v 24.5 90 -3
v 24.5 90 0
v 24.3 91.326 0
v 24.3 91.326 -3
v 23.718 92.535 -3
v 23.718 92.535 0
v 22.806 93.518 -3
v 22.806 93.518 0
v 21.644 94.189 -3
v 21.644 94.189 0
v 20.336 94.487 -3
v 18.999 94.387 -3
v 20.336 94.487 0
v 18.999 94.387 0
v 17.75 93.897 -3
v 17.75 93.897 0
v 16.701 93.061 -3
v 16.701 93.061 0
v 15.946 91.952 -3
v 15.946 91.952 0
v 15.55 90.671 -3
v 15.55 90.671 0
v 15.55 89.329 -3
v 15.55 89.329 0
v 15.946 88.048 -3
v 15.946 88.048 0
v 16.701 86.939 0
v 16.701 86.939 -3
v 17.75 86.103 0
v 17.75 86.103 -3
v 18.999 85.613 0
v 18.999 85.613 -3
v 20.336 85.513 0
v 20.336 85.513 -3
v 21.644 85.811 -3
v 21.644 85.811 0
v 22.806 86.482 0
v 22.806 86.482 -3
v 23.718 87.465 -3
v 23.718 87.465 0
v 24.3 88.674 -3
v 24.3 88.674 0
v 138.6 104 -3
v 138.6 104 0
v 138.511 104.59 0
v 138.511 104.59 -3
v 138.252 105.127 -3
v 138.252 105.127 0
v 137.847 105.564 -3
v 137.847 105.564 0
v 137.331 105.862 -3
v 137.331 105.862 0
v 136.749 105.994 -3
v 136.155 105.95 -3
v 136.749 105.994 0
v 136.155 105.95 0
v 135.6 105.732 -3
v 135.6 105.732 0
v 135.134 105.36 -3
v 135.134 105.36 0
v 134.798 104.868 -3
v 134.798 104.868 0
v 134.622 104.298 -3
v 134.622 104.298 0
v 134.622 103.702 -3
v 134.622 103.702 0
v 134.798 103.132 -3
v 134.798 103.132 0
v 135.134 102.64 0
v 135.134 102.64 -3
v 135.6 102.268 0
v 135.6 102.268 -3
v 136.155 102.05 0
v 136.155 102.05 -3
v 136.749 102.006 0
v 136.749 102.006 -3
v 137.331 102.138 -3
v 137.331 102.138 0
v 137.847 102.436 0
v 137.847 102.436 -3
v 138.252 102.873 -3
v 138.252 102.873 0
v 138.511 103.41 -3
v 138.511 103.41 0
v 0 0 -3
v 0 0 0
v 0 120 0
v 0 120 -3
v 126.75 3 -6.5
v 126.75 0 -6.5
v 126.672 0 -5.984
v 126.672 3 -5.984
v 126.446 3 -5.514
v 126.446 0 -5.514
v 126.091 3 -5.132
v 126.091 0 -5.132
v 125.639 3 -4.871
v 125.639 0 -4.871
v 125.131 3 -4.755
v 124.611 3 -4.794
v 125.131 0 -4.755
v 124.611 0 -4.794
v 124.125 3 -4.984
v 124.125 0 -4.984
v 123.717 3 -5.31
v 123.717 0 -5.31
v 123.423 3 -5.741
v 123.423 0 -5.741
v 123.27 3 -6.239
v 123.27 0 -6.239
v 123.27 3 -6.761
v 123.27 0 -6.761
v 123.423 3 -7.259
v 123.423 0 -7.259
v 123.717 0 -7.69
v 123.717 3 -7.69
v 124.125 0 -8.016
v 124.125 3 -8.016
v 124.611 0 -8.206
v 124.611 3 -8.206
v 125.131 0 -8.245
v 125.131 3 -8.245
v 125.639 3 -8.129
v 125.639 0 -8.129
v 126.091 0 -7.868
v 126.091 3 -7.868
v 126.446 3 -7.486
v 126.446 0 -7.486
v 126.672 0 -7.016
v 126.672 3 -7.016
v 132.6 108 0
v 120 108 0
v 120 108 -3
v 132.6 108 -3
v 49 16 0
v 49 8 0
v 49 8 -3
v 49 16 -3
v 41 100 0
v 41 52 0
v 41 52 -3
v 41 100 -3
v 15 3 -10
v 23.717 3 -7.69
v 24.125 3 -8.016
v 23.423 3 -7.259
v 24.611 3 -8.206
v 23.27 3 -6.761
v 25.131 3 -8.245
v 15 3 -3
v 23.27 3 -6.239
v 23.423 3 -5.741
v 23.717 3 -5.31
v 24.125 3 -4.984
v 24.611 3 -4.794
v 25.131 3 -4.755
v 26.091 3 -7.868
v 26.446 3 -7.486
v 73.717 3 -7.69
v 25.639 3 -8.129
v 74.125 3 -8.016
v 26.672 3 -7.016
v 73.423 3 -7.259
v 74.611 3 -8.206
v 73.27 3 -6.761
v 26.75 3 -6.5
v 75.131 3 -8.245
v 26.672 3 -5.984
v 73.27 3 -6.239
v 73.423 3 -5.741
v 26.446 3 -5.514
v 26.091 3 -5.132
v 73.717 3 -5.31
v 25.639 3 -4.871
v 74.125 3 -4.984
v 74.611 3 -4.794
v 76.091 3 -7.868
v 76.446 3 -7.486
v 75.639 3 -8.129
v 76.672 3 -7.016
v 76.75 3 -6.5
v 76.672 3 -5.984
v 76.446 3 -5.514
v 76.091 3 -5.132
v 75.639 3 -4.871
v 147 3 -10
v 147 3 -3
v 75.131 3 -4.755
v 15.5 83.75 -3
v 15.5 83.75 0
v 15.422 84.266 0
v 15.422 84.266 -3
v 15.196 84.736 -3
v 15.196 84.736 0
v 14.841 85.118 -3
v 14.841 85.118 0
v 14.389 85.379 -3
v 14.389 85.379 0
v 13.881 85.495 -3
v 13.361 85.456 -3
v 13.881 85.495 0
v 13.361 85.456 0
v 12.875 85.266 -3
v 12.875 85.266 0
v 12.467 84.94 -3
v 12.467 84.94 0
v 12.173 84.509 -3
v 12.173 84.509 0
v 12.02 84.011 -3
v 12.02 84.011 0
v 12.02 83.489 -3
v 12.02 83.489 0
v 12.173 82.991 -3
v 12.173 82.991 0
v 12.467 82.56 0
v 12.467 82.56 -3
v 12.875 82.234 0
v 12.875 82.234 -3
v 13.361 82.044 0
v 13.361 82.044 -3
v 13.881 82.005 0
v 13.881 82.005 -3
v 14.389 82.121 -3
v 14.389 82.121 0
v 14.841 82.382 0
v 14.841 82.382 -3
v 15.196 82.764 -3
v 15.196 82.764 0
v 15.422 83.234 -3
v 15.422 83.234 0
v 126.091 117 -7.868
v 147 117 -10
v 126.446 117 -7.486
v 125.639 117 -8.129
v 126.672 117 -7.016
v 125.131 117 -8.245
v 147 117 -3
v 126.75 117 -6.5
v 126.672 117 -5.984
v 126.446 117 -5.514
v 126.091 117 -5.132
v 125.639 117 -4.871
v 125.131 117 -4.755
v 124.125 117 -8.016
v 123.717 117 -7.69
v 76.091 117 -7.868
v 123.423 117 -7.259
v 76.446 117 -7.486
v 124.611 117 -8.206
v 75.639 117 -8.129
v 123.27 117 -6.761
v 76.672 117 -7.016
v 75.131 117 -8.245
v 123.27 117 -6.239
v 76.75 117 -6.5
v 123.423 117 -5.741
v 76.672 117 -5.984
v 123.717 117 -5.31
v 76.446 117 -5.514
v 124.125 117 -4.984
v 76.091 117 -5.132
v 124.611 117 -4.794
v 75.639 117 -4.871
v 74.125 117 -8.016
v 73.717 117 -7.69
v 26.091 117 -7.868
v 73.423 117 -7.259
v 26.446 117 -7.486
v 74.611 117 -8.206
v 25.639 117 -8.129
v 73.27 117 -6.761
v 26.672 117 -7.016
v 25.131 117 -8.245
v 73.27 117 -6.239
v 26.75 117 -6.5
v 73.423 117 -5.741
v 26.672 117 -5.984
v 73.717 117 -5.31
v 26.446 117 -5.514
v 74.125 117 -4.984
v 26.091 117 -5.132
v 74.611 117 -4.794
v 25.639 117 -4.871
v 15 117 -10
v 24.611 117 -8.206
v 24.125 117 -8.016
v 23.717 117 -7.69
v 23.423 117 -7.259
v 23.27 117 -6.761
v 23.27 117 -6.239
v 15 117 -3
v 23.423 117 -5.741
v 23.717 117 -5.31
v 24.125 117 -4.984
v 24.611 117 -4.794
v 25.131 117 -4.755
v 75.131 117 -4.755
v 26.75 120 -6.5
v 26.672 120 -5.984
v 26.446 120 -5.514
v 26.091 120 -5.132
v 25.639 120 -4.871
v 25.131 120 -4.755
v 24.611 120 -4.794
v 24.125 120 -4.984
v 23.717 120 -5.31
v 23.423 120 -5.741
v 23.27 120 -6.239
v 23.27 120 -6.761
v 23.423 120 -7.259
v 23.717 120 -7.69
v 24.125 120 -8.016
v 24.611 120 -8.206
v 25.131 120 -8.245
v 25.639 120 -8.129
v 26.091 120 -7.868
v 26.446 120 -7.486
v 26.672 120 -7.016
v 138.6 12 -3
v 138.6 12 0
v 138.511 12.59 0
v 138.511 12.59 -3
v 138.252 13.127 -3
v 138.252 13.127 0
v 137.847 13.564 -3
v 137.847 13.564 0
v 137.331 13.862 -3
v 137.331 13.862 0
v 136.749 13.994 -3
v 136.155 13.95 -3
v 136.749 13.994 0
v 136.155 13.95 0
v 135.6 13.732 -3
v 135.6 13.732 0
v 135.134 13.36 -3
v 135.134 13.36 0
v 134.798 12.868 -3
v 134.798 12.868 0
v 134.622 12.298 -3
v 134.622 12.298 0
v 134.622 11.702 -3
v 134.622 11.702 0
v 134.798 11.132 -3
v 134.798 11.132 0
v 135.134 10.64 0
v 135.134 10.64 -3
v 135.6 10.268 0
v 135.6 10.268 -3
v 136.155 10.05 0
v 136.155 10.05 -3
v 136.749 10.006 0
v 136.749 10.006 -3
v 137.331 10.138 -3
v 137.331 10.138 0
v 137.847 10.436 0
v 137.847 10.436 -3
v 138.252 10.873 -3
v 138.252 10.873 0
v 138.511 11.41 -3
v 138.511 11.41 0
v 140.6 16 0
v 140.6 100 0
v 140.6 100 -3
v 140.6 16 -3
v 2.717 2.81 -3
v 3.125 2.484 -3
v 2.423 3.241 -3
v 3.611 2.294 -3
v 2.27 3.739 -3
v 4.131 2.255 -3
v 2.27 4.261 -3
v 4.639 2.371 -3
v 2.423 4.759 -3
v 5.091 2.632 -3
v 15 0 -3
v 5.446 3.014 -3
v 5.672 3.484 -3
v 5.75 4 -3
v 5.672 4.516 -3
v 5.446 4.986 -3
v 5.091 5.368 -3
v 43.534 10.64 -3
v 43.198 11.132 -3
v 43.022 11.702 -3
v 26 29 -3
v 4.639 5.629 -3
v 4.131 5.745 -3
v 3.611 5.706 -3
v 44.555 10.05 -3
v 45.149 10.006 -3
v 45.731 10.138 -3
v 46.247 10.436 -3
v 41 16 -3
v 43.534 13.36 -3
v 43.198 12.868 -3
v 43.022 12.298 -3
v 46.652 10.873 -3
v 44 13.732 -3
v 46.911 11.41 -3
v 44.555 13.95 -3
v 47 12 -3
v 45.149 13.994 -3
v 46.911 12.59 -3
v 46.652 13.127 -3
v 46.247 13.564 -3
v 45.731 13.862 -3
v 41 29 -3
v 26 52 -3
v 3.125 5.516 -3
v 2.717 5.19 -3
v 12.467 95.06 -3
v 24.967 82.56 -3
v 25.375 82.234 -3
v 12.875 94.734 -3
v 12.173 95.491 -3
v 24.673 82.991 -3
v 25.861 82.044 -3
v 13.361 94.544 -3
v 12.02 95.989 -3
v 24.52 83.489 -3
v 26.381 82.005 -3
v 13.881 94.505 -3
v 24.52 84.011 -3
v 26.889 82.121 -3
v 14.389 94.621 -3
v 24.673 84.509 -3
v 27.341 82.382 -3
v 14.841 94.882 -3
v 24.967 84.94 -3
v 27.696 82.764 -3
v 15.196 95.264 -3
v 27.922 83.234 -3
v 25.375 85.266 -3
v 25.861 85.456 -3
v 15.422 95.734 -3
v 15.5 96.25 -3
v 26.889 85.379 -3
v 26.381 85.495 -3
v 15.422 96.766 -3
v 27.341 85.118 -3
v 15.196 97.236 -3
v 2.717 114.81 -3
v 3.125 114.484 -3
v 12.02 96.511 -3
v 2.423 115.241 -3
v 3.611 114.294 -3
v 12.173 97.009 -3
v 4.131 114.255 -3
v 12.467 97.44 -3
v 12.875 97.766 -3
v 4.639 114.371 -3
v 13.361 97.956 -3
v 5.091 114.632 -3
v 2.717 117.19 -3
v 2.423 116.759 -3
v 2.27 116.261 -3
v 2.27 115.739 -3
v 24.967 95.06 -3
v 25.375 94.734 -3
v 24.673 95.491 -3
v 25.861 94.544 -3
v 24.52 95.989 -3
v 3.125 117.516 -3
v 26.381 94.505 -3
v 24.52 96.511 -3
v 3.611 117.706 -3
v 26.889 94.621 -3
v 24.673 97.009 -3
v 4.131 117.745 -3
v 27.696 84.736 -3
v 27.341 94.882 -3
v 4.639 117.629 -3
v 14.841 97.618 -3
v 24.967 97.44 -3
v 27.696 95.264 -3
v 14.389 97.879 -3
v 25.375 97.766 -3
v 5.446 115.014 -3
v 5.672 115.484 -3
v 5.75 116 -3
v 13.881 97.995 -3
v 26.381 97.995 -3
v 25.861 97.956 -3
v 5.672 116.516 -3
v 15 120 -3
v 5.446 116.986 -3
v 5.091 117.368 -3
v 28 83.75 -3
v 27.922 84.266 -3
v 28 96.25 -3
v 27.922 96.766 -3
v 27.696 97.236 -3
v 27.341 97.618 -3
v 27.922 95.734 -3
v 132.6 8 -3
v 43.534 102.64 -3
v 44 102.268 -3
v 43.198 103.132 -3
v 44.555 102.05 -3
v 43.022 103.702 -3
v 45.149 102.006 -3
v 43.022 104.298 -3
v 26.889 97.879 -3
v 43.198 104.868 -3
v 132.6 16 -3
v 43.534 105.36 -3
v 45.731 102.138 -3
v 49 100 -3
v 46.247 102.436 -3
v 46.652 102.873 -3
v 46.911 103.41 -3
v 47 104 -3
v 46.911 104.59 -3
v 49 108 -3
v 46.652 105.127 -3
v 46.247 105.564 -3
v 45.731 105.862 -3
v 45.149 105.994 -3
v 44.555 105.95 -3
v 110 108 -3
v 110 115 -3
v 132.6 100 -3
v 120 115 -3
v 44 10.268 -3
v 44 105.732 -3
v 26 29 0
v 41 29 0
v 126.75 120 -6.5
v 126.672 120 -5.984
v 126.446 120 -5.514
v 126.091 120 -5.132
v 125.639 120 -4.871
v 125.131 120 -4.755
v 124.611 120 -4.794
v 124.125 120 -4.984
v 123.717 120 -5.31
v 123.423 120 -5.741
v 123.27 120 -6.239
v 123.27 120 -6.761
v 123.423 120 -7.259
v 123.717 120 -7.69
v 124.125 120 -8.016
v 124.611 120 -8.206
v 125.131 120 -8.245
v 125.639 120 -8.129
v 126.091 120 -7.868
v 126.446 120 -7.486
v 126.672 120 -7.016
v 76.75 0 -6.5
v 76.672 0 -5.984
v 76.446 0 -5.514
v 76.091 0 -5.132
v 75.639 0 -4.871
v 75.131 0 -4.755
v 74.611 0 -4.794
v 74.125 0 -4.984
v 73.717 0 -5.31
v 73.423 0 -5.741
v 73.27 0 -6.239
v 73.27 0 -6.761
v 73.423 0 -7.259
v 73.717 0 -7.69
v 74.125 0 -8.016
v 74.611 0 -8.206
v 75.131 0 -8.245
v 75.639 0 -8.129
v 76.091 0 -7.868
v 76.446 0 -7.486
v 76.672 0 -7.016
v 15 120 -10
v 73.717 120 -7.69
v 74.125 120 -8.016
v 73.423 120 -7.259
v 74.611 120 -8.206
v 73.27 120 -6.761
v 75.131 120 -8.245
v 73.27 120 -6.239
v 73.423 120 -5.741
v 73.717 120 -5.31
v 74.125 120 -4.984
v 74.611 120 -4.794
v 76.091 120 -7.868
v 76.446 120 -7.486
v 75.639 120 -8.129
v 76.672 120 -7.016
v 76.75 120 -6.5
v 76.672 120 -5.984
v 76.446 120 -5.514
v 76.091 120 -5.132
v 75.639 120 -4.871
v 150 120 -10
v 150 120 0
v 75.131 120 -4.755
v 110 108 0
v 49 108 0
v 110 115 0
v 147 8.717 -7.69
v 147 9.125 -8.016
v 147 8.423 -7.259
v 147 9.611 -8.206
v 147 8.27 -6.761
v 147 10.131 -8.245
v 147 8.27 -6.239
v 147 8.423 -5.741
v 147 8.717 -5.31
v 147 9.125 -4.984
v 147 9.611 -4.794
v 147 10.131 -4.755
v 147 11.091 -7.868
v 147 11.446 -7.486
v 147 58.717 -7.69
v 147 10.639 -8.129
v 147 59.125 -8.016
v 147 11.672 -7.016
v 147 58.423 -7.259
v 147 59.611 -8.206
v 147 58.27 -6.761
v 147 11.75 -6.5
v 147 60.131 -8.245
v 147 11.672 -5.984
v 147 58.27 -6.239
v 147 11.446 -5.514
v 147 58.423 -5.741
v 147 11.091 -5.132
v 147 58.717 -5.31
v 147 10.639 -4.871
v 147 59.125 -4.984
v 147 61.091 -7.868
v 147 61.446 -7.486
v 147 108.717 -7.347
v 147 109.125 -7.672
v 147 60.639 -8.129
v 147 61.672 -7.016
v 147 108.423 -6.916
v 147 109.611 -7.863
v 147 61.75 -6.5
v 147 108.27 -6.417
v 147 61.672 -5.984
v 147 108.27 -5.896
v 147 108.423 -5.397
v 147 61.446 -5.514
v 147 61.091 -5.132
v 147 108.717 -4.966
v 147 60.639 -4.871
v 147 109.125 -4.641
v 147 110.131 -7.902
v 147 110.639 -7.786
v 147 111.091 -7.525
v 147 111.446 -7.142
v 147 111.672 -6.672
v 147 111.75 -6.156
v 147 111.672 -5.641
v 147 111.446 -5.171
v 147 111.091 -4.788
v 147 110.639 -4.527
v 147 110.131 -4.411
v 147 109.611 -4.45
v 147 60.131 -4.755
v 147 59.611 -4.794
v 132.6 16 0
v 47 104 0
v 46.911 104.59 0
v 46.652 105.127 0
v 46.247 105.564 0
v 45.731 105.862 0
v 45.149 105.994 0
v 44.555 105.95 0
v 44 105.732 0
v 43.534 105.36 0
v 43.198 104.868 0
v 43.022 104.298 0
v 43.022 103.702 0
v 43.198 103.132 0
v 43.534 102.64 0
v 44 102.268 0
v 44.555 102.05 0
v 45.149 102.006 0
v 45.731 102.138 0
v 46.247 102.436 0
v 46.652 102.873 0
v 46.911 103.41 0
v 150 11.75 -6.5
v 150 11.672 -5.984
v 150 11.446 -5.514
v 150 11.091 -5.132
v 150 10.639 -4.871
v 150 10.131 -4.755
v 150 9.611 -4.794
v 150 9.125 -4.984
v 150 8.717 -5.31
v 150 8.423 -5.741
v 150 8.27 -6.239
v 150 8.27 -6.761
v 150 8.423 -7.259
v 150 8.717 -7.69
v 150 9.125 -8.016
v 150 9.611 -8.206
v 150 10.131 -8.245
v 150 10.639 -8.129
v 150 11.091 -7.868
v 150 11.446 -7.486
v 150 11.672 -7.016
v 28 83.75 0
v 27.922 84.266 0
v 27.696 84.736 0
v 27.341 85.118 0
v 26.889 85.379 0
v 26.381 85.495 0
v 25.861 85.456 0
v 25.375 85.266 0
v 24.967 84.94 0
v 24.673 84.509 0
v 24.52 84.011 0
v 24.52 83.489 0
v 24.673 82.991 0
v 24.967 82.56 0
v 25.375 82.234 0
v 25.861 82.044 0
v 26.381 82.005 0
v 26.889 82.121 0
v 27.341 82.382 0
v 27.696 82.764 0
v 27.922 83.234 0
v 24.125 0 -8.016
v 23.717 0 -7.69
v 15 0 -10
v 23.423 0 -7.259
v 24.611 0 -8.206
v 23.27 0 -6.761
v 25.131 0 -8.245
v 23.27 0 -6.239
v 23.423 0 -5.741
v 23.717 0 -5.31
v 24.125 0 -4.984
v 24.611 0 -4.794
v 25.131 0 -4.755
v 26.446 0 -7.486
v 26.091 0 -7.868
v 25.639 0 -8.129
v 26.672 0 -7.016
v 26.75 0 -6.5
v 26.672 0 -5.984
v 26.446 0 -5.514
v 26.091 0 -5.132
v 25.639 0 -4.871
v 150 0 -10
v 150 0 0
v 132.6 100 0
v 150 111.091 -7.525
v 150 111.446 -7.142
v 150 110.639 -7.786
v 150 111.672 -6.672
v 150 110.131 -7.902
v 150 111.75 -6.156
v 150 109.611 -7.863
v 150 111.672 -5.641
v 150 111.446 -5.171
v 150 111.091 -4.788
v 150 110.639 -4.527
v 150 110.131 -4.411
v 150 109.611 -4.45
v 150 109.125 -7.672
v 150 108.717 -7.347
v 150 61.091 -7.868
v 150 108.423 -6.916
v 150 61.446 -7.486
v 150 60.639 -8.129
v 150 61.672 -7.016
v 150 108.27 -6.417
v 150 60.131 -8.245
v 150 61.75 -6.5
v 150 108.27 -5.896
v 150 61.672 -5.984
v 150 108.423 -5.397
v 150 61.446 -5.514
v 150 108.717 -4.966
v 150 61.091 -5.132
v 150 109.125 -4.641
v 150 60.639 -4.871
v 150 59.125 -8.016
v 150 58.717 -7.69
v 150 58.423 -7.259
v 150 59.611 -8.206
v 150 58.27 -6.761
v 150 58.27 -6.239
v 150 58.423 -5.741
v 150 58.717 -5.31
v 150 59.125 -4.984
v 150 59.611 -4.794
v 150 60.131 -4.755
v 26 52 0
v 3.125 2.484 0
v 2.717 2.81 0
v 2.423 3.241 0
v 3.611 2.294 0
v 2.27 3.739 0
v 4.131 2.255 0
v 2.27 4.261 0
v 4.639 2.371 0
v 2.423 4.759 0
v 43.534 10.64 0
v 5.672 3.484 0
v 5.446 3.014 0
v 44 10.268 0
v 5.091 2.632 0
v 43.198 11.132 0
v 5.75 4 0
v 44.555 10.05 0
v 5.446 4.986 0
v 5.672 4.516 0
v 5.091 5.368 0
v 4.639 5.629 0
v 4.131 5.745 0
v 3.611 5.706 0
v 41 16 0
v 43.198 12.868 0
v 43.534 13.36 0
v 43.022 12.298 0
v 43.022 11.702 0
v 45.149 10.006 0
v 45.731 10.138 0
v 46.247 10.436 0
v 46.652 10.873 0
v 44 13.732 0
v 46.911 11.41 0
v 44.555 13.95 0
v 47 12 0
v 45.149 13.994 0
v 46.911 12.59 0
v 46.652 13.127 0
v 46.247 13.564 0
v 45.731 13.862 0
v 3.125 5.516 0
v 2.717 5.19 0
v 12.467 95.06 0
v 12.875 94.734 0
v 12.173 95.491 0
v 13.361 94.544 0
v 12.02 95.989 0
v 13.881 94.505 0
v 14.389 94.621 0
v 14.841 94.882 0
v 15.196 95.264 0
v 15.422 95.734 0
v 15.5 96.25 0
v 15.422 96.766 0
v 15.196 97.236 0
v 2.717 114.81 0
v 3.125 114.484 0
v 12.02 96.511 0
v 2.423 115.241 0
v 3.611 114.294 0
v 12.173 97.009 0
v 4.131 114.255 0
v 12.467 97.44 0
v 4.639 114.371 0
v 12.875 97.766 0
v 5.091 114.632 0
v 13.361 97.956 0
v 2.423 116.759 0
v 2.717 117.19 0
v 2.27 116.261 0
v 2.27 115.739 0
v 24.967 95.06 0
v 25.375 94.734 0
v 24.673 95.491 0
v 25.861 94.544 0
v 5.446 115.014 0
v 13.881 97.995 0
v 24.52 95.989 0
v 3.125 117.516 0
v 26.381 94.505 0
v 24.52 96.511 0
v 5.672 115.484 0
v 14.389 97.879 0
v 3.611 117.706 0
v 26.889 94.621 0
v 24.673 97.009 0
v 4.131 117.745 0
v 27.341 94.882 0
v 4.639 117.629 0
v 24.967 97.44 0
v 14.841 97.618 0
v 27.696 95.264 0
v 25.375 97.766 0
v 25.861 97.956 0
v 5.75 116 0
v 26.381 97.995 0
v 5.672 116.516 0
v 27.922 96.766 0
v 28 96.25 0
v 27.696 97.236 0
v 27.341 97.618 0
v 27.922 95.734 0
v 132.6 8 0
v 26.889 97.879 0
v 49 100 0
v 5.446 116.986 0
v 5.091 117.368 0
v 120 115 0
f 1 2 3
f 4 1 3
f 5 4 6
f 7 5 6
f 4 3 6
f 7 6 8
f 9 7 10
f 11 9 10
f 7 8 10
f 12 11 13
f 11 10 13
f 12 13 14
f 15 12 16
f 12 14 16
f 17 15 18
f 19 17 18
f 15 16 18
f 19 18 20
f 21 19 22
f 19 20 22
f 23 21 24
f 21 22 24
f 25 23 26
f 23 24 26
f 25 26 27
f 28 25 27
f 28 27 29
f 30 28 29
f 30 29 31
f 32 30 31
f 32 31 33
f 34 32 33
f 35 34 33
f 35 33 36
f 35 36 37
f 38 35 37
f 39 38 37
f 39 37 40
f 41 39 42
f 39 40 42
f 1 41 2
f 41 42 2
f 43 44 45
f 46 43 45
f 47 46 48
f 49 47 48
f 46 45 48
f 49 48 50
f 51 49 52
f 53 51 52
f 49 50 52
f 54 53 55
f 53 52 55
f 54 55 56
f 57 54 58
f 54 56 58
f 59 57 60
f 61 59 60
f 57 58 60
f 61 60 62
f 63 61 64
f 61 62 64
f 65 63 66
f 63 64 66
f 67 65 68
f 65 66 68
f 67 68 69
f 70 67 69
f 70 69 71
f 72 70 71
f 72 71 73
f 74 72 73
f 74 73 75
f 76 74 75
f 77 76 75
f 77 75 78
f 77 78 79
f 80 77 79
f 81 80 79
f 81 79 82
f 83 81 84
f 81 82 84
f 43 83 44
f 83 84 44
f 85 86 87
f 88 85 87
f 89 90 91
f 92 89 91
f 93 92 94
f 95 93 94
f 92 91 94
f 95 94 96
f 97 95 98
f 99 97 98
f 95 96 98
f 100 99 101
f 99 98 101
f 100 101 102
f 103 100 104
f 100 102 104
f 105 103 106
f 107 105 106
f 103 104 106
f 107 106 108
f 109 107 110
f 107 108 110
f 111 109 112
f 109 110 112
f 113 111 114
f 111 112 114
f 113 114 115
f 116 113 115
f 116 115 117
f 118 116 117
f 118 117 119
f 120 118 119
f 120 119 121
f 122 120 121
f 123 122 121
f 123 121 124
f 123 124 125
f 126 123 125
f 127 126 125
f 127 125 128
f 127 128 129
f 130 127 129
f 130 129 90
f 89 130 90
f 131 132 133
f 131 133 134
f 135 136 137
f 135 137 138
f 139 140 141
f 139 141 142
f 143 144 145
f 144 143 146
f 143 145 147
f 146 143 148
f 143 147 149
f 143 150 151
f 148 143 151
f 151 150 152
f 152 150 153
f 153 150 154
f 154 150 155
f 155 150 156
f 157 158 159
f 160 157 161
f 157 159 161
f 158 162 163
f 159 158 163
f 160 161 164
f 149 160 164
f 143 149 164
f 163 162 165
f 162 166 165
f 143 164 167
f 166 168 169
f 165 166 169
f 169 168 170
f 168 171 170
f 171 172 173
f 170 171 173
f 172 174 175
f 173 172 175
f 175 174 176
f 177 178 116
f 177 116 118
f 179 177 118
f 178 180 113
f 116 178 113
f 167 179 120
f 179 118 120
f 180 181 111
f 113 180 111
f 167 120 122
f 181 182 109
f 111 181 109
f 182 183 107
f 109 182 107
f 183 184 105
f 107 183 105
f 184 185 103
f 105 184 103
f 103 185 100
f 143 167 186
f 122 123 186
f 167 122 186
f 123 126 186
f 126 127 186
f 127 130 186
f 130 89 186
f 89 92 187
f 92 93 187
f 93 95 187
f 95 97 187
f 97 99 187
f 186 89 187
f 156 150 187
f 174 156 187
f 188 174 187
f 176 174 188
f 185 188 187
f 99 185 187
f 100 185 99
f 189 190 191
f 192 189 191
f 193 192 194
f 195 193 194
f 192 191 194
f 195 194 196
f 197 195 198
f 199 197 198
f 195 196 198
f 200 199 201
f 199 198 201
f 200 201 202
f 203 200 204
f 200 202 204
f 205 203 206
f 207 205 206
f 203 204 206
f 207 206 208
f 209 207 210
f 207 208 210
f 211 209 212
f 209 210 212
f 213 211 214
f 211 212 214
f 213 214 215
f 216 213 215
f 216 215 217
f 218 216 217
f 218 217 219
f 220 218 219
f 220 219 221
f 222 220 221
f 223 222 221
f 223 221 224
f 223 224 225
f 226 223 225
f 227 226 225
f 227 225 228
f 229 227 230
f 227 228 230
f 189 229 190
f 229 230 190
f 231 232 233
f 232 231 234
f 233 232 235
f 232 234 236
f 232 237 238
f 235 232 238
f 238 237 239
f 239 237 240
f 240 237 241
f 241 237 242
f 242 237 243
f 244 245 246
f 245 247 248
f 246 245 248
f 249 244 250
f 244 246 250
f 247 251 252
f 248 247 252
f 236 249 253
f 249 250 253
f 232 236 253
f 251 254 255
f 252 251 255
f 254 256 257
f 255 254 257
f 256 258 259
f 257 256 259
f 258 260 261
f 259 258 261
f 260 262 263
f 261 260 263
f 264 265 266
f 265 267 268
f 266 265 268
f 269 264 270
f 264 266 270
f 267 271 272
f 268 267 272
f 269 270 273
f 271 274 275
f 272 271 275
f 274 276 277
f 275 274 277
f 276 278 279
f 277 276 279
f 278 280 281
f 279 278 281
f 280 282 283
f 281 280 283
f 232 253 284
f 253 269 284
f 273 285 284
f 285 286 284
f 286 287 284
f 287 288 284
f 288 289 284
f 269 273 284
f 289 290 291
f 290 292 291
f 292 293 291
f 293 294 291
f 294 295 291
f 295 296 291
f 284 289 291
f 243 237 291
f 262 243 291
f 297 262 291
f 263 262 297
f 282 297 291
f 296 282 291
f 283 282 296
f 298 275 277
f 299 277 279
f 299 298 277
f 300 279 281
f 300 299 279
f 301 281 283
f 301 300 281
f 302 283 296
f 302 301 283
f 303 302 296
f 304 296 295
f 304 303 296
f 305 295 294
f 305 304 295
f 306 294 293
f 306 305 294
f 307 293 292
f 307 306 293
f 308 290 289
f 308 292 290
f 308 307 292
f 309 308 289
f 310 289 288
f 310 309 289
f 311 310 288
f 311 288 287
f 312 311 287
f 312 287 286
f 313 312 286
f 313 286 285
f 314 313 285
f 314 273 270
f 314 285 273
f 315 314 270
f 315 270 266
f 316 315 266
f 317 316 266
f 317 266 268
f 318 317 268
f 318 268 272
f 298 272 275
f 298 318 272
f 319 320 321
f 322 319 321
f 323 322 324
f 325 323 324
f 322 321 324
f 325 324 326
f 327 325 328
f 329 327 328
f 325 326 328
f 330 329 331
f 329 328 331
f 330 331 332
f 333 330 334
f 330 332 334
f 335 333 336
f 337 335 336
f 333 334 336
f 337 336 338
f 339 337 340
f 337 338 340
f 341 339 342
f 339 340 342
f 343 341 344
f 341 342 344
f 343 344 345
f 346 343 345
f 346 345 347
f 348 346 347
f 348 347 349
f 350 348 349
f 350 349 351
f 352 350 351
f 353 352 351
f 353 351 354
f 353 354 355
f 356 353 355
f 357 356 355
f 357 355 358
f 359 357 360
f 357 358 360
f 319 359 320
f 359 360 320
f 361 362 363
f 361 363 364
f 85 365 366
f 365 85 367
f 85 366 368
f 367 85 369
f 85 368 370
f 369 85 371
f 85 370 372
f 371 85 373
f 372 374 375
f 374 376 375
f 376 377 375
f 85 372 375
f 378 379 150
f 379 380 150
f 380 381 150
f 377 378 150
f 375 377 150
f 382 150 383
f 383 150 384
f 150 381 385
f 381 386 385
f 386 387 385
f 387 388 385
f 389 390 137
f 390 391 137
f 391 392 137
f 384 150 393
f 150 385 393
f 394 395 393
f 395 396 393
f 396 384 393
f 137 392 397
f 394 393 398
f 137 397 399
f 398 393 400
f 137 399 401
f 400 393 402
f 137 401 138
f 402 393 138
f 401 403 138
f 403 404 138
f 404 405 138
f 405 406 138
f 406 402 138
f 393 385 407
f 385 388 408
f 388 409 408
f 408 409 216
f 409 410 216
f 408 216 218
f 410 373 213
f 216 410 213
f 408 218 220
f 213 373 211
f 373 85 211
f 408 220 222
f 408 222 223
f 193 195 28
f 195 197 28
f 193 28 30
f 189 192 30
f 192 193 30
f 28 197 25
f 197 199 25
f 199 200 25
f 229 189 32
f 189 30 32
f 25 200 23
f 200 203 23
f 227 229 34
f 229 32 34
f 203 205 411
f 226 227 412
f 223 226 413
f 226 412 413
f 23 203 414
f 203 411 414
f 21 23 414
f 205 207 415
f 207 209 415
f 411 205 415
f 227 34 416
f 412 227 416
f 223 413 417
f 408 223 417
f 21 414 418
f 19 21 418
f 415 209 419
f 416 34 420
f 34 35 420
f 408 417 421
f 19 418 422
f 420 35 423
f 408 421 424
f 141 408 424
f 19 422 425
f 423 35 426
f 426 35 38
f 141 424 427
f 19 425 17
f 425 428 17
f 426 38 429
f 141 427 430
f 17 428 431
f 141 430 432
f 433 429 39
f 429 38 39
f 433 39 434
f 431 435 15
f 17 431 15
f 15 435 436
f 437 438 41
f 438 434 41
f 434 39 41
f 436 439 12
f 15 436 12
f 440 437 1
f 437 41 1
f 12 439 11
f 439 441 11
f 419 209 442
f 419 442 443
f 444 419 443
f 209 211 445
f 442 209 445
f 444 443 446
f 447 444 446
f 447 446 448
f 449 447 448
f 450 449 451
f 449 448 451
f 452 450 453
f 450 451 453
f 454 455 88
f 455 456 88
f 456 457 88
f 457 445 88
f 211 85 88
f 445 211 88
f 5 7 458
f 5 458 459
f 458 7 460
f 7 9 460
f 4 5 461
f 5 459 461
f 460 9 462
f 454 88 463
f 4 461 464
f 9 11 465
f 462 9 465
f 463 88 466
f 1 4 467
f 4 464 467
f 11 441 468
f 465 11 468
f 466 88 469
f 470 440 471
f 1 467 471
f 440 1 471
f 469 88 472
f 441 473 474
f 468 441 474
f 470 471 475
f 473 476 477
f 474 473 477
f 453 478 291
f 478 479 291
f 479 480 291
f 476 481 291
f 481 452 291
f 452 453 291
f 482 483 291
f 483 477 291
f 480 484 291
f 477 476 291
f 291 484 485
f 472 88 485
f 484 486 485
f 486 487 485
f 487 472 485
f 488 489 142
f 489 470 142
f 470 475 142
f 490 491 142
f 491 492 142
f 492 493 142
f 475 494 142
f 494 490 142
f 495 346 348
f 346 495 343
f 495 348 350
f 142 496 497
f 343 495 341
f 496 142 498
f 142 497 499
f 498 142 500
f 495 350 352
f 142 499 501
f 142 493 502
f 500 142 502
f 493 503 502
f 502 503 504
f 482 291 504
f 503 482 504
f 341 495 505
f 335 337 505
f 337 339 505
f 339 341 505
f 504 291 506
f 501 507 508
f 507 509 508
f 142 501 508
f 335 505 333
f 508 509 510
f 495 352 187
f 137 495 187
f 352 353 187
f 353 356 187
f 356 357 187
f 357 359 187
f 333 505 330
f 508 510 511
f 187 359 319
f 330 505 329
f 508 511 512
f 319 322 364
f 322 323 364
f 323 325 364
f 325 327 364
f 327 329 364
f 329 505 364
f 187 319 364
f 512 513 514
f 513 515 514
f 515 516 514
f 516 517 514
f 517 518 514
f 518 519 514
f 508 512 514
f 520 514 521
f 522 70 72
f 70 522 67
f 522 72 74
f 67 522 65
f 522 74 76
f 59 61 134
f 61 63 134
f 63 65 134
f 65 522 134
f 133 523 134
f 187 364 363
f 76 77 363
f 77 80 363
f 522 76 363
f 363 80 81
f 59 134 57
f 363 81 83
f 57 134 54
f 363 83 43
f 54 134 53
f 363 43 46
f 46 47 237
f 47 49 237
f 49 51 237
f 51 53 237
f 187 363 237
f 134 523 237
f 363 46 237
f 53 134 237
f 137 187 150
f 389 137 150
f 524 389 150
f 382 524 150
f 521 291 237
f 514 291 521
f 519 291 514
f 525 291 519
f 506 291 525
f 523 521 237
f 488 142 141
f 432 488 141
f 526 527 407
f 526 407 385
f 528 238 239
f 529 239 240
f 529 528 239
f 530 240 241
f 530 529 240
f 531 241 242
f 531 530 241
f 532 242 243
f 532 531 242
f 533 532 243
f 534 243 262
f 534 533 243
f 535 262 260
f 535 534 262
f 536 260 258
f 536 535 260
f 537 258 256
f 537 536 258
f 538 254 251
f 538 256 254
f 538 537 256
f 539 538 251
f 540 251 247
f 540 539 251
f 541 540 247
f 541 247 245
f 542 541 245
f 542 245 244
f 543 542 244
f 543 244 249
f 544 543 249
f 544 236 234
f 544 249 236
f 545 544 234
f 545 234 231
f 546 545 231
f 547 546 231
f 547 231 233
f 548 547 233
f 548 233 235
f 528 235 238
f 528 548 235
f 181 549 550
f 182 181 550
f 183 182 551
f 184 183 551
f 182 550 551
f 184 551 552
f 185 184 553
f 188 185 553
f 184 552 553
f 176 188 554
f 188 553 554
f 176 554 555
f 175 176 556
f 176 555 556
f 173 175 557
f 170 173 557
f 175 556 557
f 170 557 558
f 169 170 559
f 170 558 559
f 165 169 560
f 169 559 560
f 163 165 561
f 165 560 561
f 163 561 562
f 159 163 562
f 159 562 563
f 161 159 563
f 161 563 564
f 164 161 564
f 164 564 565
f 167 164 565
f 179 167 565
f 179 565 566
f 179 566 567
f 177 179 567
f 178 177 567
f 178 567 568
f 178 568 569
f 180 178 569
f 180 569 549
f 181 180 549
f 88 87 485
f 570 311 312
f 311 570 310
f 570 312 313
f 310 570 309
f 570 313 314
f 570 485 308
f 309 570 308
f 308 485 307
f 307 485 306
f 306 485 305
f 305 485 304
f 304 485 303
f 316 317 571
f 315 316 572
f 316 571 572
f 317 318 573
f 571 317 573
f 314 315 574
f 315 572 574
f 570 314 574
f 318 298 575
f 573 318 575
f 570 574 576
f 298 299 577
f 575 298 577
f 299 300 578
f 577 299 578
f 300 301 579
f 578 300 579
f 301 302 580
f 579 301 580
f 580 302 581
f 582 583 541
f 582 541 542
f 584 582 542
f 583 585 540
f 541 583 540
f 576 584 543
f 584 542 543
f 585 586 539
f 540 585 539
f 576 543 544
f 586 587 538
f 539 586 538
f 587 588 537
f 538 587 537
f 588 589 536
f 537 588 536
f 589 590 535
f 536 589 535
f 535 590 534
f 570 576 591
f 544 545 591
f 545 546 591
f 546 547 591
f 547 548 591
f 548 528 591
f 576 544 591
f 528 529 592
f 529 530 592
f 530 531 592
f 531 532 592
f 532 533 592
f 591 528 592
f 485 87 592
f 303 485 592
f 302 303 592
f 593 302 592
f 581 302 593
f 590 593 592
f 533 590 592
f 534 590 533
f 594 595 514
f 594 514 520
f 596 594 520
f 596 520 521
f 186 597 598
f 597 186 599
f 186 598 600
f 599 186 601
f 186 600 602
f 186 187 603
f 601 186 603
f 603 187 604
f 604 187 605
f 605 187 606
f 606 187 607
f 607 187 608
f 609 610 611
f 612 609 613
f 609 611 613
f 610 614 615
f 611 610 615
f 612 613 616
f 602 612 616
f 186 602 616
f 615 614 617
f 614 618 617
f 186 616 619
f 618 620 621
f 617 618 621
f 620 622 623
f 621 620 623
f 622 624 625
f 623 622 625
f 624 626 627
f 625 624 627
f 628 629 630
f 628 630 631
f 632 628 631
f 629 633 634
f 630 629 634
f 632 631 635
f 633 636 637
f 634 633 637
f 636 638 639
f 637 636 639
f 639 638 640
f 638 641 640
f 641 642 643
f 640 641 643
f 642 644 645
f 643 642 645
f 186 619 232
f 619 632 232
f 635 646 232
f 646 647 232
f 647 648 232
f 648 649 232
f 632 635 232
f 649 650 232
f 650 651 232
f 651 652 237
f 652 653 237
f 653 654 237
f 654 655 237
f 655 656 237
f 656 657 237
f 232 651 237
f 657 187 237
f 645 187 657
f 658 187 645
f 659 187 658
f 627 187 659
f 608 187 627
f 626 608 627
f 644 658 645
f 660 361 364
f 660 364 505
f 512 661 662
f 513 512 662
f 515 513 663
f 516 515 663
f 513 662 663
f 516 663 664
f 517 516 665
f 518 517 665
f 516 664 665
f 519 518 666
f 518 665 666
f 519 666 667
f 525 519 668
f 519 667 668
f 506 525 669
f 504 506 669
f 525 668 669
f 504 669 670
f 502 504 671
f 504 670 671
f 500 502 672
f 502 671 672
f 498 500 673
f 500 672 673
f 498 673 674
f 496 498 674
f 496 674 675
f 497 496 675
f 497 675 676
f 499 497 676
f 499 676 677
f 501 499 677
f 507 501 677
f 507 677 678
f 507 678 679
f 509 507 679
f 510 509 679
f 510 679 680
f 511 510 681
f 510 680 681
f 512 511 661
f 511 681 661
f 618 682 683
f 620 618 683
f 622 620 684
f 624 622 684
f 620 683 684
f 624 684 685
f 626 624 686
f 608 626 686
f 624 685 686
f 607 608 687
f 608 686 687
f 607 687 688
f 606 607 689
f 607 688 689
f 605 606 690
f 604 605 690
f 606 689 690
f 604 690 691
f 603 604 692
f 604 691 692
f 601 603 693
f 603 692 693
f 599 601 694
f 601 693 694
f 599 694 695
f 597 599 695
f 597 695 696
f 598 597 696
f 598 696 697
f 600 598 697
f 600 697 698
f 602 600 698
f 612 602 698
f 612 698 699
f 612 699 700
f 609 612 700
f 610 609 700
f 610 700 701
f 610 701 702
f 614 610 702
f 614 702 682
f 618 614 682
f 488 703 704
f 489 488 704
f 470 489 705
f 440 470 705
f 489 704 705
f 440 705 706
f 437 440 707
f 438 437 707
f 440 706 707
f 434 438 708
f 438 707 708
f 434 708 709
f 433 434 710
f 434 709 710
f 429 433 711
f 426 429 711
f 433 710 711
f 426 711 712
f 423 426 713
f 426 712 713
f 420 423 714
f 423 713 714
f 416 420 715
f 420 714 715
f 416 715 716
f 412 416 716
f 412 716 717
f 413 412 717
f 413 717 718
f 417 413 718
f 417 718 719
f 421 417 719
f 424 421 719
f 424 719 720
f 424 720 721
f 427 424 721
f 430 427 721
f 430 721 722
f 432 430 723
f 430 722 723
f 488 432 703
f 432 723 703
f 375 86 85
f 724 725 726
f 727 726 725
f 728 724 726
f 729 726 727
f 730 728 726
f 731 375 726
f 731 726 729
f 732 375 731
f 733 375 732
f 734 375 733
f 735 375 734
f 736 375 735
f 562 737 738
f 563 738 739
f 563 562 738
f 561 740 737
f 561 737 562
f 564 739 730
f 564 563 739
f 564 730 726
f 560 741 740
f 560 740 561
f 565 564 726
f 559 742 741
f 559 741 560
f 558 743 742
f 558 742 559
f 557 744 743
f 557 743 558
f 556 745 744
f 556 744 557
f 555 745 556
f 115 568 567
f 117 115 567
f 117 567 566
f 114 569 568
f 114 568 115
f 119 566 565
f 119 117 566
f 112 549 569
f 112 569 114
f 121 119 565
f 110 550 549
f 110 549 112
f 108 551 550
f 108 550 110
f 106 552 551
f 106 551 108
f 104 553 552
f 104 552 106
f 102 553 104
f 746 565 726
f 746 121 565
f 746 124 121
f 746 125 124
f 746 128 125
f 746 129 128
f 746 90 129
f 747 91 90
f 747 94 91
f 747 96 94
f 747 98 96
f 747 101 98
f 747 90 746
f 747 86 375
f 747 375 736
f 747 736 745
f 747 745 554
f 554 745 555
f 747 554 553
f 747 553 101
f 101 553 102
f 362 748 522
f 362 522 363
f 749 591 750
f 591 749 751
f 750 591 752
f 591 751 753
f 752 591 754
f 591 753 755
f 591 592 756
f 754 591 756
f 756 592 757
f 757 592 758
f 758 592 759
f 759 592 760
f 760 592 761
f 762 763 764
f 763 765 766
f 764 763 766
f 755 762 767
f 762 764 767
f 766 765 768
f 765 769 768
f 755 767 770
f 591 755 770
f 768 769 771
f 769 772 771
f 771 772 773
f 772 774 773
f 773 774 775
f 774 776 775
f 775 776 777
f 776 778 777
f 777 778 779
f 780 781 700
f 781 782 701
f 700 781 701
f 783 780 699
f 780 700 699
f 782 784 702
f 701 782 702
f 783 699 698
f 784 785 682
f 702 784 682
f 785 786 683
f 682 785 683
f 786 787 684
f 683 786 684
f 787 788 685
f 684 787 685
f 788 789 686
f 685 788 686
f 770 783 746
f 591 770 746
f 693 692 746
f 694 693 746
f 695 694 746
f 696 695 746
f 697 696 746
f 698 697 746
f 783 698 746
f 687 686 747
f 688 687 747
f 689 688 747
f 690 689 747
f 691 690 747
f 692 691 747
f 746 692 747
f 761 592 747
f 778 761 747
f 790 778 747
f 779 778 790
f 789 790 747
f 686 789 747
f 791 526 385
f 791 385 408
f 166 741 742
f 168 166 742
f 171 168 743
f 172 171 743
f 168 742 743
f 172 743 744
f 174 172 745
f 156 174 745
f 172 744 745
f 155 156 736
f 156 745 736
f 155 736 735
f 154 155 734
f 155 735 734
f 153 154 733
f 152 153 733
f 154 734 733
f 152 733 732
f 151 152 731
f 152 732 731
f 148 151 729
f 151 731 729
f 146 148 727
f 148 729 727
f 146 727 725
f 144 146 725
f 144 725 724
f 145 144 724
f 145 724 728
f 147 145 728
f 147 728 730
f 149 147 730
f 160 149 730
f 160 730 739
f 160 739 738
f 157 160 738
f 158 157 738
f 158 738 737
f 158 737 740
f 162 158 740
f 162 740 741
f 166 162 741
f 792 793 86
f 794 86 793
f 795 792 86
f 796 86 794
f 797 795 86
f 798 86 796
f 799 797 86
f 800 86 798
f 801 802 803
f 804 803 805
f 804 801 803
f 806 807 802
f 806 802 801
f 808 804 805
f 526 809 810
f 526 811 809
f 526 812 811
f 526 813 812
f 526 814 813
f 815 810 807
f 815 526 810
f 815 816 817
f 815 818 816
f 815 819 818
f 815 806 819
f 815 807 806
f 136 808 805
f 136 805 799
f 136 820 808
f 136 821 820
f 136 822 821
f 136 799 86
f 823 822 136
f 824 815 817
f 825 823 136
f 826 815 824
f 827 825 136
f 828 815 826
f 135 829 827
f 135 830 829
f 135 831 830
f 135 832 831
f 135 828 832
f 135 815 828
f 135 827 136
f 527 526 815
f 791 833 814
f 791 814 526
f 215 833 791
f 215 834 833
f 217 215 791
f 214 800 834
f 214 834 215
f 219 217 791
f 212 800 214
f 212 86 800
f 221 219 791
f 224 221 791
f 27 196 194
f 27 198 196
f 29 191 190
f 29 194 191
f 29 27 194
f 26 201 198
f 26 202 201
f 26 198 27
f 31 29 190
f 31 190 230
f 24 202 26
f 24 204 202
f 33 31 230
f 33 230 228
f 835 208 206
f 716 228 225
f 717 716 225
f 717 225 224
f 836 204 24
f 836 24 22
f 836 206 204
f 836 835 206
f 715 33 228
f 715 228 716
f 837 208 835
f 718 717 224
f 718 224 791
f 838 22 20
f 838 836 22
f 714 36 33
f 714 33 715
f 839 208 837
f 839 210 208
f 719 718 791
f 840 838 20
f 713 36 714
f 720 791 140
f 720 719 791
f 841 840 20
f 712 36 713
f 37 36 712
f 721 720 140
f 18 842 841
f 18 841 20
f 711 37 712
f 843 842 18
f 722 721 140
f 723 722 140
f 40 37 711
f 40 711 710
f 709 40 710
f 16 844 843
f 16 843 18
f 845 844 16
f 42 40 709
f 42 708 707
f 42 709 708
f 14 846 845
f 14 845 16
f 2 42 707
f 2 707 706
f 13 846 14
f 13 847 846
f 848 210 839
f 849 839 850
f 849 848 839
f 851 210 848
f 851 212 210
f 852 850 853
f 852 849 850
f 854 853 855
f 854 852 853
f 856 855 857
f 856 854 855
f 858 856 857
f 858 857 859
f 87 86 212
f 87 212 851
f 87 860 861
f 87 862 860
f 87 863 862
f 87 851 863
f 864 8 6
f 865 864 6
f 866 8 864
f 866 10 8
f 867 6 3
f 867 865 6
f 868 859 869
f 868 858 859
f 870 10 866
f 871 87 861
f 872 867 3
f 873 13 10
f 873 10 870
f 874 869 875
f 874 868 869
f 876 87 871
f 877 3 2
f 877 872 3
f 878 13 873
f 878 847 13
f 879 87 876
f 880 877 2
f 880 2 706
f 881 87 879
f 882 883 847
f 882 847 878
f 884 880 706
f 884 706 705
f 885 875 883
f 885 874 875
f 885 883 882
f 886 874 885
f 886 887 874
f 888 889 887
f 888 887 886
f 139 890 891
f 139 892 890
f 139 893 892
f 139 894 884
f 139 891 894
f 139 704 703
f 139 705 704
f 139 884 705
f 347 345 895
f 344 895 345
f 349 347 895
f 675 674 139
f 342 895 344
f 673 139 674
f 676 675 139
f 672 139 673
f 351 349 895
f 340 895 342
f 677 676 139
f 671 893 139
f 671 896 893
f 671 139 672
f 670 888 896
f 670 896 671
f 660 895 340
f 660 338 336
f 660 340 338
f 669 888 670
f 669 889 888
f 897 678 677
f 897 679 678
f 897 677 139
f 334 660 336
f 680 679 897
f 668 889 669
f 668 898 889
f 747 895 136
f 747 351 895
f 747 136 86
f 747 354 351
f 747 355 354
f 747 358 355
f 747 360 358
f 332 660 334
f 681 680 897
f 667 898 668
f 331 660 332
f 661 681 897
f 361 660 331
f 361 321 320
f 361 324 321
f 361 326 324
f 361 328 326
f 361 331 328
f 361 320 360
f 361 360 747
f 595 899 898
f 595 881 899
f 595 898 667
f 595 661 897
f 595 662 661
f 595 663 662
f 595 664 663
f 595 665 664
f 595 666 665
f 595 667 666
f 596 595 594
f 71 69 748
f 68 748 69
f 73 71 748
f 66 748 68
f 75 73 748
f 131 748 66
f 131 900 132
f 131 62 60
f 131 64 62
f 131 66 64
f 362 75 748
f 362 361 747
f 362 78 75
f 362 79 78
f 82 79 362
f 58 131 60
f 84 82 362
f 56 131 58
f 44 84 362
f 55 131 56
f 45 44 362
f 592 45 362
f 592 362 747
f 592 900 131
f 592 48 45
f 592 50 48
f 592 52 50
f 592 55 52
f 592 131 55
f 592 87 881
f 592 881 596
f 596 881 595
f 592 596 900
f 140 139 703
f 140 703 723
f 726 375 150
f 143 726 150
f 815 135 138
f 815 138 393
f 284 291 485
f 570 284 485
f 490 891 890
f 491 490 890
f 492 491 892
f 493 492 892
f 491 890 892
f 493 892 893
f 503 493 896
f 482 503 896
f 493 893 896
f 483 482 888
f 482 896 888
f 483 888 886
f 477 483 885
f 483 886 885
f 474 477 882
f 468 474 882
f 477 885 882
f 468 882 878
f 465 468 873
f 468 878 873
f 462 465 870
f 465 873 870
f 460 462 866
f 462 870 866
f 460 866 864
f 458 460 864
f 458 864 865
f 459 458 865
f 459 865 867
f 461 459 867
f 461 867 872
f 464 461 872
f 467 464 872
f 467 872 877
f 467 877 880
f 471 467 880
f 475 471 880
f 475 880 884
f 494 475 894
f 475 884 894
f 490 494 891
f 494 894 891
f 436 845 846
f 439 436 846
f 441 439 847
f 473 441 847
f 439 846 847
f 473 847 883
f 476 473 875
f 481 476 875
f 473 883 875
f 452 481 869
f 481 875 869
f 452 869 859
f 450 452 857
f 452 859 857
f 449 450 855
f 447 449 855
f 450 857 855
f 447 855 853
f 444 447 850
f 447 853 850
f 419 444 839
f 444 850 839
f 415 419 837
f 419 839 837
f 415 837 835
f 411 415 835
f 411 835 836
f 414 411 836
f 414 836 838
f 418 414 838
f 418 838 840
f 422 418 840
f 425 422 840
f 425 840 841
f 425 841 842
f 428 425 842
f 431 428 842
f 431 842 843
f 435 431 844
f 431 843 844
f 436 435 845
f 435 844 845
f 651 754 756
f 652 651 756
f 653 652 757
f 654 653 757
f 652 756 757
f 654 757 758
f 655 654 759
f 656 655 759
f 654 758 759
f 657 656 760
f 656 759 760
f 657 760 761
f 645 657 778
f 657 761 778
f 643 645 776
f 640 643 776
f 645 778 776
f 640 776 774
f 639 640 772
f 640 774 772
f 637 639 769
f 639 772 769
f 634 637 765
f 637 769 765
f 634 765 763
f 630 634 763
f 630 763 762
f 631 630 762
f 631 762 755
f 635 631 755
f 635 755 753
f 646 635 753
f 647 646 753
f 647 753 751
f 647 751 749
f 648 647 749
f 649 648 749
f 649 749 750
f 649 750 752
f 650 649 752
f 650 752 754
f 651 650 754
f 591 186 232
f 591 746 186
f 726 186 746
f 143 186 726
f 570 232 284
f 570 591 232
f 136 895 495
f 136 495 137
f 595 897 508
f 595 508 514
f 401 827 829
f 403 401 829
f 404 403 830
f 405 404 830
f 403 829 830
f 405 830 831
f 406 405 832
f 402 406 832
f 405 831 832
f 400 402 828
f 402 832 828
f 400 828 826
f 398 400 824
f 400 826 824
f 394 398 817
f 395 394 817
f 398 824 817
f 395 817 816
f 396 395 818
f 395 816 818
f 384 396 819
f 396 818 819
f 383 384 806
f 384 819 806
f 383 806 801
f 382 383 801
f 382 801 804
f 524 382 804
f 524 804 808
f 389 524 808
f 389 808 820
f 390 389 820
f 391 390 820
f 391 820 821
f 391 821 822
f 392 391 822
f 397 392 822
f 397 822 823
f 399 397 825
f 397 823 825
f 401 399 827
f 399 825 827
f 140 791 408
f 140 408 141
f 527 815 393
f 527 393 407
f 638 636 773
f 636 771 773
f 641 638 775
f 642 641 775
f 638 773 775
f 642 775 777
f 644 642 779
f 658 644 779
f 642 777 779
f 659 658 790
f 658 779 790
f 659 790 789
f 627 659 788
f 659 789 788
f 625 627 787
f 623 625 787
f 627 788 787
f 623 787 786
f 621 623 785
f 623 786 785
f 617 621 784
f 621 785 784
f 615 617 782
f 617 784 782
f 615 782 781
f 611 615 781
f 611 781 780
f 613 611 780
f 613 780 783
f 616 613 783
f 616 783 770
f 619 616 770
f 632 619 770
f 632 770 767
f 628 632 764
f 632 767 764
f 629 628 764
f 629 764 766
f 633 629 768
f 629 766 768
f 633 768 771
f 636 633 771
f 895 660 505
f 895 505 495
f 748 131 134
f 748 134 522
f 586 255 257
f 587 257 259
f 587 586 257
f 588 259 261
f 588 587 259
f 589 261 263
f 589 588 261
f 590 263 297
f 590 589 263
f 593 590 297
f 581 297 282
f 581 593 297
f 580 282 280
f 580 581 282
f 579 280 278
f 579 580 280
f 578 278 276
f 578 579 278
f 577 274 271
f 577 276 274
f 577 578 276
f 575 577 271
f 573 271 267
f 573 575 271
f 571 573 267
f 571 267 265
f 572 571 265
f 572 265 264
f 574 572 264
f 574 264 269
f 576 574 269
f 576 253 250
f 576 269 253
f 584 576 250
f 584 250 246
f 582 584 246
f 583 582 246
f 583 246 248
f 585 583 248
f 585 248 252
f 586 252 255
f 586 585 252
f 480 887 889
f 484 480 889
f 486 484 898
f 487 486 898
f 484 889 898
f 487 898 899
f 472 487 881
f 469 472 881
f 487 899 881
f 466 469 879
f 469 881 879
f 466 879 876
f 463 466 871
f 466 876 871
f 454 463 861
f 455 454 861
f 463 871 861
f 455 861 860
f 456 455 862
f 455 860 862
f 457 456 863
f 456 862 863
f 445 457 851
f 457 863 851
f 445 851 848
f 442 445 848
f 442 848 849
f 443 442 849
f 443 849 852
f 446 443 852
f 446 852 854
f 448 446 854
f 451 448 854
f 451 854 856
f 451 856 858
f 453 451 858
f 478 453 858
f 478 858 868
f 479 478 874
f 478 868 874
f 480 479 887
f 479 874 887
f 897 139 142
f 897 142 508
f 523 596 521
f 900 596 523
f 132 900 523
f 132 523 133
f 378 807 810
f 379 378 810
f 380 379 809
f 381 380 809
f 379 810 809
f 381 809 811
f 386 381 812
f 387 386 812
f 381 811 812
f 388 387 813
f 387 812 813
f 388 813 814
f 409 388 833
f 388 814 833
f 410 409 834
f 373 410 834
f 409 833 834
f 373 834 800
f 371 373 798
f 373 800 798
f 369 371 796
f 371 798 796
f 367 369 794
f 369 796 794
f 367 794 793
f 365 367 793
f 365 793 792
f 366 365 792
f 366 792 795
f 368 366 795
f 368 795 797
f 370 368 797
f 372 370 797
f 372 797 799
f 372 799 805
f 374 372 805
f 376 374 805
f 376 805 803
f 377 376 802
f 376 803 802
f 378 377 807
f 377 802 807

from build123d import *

# Parameters (mm, degrees)
SKETCH_W        = 150
SKETCH_H        = 120
SKETCH_R        = 4.5
SKETCH_R_2      = 1.75
SKETCH_R_3      = 2
PAD_DEPTH       = 3
PAD001_DEPTH    = 7
SKETCH003_R     = 1.75
POCKET_DEPTH    = 5
SKETCH002_R     = 1.75
POCKET001_DEPTH = 5
SKETCH004_R     = 1.75
POCKET002_DEPTH = 5


with BuildPart() as part:
    # Sketch → Pad (new body)
    with BuildSketch(Plane.XY):
        with Locations((75, 60)):
            Rectangle(SKETCH_W, SKETCH_H)
        with Locations((20, 90)):
            Circle(SKETCH_R, mode=Mode.SUBTRACT)
        with Locations((13.75, 96.25)):
            Circle(SKETCH_R_2, mode=Mode.SUBTRACT)
        with Locations((26.25, 96.25)):
            Circle(SKETCH_R_2, mode=Mode.SUBTRACT)
        with Locations((13.75, 83.75)):
            Circle(SKETCH_R_2, mode=Mode.SUBTRACT)
        with Locations((26.25, 83.75)):
            Circle(SKETCH_R_2, mode=Mode.SUBTRACT)
        with Locations((4, 116)):
            Circle(SKETCH_R_2, mode=Mode.SUBTRACT)
        with Locations((4, 4)):
            Circle(SKETCH_R_2, mode=Mode.SUBTRACT)
        with Locations((45, 104)):
            Circle(SKETCH_R_3, mode=Mode.SUBTRACT)
        with Locations((136.6, 104)):
            Circle(SKETCH_R_3, mode=Mode.SUBTRACT)
        with Locations((45, 12)):
            Circle(SKETCH_R_3, mode=Mode.SUBTRACT)
        with Locations((136.6, 12)):
            Circle(SKETCH_R_3, mode=Mode.SUBTRACT)
        Polygon((49, 108), (110, 108), (110, 115), (120, 115), (120, 108), (132.6, 108), (132.6, 100), (140.6, 100), (140.6, 16), (132.6, 16), (132.6, 8), (49, 8), (49, 16), (41, 16), (41, 29), (26, 29), (26, 52), (41, 52), (41, 100), (49, 100), align=None, mode=Mode.SUBTRACT)
    extrude(amount=-PAD_DEPTH)

    # Sketch001 (on DatumPlane) → Pad001 (join)
    with BuildSketch(Plane.XY.offset(-3)):
        Polygon((15, 117), (15, 120), (150, 120), (150, 0), (15, 0), (15, 3), (147, 3), (147, 117), align=None)
    extrude(amount=-PAD001_DEPTH)

    # Sketch003 (on DatumPlane) → Pocket (cut)
    with BuildSketch(Plane.XZ.offset(-120)):
        with Locations((25, -6.5)):
            Circle(SKETCH003_R)
        with Locations((75, -6.5)):
            Circle(SKETCH003_R)
        with Locations((125, -6.5)):
            Circle(SKETCH003_R)
    extrude(amount=POCKET_DEPTH, mode=Mode.SUBTRACT)

    # Sketch002 → Pocket001 (cut)
    with BuildSketch(Plane.XZ):
        with Locations((25, -6.5)):
            Circle(SKETCH002_R)
        with Locations((75, -6.5)):
            Circle(SKETCH002_R)
        with Locations((125, -6.5)):
            Circle(SKETCH002_R)
    extrude(amount=-POCKET001_DEPTH, mode=Mode.SUBTRACT)

    # Sketch004 (on DatumPlane) → Pocket002 (cut, symmetric)
    with BuildSketch(Plane.YZ.offset(150)):
        with Locations((10, -6.5)):
            Circle(SKETCH004_R)
        with Locations((110, -6.156497)):
            Circle(SKETCH004_R)
        with Locations((60, -6.5)):
            Circle(SKETCH004_R)
    extrude(amount=POCKET002_DEPTH, both=True, mode=Mode.SUBTRACT)


solid = part.part
